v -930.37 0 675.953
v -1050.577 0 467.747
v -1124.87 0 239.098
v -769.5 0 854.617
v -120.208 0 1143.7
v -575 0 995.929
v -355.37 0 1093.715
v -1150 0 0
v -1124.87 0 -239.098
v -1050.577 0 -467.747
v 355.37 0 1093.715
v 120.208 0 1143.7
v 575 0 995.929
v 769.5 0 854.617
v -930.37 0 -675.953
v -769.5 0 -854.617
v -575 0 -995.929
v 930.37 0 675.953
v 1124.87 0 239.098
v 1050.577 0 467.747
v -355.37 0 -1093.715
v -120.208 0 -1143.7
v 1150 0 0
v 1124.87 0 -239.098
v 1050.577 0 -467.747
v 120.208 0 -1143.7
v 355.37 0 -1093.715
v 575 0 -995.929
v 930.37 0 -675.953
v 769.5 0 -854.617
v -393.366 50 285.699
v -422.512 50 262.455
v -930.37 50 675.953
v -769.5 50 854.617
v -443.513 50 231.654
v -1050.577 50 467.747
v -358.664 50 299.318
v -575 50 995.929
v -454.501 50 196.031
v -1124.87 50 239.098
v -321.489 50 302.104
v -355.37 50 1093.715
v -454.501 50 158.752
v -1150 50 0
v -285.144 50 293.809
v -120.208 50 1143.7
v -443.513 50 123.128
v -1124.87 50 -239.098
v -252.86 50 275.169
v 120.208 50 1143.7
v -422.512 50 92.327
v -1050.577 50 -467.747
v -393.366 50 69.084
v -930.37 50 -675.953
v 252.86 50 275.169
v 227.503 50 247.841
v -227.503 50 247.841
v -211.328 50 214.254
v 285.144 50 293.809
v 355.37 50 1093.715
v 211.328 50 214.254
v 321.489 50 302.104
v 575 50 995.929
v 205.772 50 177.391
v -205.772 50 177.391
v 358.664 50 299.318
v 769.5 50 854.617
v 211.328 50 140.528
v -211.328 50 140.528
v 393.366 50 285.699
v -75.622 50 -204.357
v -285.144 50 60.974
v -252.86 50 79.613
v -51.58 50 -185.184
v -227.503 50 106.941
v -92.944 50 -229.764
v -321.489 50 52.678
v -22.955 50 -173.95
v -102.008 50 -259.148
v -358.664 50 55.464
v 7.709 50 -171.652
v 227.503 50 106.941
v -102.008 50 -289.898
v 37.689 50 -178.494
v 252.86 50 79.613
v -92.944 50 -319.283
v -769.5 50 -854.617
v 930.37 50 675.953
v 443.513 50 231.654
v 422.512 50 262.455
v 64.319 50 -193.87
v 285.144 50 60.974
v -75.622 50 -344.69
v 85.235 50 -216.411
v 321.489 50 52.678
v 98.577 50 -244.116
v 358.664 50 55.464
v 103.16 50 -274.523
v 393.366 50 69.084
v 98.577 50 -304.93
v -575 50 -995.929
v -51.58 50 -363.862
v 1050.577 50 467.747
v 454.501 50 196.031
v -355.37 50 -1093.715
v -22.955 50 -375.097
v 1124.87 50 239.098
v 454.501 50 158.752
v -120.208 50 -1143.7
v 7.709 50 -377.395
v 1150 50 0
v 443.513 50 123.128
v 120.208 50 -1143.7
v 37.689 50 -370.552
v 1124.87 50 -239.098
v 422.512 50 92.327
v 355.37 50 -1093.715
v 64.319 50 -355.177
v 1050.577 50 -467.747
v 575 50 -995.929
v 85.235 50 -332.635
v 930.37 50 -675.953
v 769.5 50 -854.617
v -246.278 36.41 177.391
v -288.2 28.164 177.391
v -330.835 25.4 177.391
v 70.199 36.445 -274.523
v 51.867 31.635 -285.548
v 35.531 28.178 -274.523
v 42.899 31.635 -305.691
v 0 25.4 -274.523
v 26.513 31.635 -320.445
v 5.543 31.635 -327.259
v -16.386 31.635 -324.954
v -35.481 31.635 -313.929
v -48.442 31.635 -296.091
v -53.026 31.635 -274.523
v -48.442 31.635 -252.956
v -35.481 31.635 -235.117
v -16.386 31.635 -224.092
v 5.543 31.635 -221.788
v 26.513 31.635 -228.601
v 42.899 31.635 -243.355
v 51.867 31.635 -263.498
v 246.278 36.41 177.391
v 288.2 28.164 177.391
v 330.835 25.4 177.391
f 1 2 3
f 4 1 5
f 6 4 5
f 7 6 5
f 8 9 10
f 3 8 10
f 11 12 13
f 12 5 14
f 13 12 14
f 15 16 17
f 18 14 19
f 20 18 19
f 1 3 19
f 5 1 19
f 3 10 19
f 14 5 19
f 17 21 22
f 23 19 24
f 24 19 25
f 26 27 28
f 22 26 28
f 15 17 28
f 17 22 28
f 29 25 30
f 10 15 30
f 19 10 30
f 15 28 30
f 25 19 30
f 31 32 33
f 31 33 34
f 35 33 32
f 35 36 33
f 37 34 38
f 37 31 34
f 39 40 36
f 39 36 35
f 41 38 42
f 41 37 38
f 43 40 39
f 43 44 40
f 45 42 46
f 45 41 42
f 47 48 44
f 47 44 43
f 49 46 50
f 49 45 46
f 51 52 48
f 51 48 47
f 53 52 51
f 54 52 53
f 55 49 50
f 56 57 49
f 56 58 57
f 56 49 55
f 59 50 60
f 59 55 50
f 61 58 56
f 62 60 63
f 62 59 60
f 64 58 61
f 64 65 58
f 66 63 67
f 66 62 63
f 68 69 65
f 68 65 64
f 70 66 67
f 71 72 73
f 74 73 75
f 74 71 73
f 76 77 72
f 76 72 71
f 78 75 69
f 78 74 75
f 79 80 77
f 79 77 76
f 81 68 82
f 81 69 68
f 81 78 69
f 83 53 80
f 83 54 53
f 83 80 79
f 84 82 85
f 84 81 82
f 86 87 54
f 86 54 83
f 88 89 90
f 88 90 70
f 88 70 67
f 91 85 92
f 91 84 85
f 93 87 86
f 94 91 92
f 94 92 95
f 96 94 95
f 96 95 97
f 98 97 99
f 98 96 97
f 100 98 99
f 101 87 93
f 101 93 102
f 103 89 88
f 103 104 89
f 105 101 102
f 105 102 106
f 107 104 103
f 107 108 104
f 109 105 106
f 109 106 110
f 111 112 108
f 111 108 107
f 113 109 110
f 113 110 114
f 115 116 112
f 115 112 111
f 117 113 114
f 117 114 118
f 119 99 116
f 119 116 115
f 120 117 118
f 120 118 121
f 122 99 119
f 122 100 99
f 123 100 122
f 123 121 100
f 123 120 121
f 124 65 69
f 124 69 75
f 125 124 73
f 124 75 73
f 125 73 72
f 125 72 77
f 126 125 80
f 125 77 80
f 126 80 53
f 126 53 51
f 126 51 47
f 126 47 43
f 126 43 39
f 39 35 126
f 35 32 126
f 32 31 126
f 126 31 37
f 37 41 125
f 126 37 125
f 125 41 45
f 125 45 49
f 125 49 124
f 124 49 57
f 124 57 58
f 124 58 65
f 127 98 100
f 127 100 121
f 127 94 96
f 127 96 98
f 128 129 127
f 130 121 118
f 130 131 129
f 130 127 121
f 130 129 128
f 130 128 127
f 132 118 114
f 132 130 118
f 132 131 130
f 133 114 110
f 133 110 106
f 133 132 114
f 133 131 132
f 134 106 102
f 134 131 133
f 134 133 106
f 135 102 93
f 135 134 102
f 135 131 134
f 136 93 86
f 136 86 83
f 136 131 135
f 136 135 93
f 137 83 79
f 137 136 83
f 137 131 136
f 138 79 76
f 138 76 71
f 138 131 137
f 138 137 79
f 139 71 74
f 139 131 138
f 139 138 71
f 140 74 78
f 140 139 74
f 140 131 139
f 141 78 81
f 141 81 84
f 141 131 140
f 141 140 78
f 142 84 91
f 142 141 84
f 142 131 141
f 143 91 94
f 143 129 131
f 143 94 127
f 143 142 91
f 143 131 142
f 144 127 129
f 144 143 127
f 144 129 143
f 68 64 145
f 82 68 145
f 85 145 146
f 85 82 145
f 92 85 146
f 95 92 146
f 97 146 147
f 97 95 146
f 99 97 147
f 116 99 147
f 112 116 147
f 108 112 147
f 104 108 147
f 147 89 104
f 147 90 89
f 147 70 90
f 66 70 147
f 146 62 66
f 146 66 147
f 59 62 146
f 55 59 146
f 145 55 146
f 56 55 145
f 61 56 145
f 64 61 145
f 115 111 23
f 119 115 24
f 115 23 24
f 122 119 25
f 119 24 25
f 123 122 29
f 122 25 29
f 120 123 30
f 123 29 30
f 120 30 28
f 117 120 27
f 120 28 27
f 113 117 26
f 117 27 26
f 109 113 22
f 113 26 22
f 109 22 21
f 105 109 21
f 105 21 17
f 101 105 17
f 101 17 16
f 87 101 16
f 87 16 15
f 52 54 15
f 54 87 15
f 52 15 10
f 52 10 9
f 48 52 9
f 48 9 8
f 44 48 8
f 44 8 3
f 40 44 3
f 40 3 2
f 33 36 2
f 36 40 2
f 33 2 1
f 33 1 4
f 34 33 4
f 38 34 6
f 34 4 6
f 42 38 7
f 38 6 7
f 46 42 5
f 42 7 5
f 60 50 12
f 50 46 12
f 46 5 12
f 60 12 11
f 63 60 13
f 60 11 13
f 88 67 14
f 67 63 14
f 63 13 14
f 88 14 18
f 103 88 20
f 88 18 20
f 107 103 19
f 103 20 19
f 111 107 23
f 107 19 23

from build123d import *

# Parameters (mm, degrees)
SKETCH1_R           = 1150
BOSS_EXTRUDE1_DEPTH = 50


with BuildPart() as part:
    # Sketch1 → Boss-Extrude1 (new body)
    with BuildSketch(Plane(origin=(0, 0, 0), x_dir=(1, 0, 0), z_dir=(0, 1, 0))):
        Circle(SKETCH1_R)
    extrude(amount=BOSS_EXTRUDE1_DEPTH)

    # Sketch3 → Cut-Revolve2 (revolve, cut)
    with BuildSketch(Plane.XY.offset(177.391142296)):
        with BuildLine():
            ThreePointArc((-330.835, 25.4), (-267.105415034, 31.608364305), (-205.772295727, 50))
            Line((-205.772295727, 50), (-330.835, 50))
            Line((-330.835, 50), (-330.835, 25.4))
        make_face()
    revolve(axis=Axis((-330.835, 25.4, 177.391142296), (0, 1, 0)), mode=Mode.SUBTRACT)

    # Sketch3<4> → Cut-Revolve3 (revolve, cut)
    with BuildSketch(Plane.XY.offset(177.391142296)):
        with BuildLine():
            Line((330.835, 50), (330.835, 25.4))
            ThreePointArc((330.835, 25.4), (267.105415034, 31.608364305), (205.772295727, 50))
            Line((205.772295727, 50), (330.835, 50))
        make_face()
    revolve(axis=Axis((330.835, 50, 177.391142296), (0, -1, 0)), mode=Mode.SUBTRACT)

    # Sketch6 → Cut-Revolve4 (revolve, cut)
    with BuildSketch(Plane.XY.offset(-274.523238616)):
        with BuildLine():
            ThreePointArc((0, 25.4), (53.026219929, 31.635029737), (103.159875921, 50))
            Line((103.159875921, 50), (0, 50))
            Line((0, 50), (0, 25.4))
        make_face()
    revolve(axis=Axis((0, 25.4, -274.523238616), (0, 1, 0)), mode=Mode.SUBTRACT)


solid = part.part
